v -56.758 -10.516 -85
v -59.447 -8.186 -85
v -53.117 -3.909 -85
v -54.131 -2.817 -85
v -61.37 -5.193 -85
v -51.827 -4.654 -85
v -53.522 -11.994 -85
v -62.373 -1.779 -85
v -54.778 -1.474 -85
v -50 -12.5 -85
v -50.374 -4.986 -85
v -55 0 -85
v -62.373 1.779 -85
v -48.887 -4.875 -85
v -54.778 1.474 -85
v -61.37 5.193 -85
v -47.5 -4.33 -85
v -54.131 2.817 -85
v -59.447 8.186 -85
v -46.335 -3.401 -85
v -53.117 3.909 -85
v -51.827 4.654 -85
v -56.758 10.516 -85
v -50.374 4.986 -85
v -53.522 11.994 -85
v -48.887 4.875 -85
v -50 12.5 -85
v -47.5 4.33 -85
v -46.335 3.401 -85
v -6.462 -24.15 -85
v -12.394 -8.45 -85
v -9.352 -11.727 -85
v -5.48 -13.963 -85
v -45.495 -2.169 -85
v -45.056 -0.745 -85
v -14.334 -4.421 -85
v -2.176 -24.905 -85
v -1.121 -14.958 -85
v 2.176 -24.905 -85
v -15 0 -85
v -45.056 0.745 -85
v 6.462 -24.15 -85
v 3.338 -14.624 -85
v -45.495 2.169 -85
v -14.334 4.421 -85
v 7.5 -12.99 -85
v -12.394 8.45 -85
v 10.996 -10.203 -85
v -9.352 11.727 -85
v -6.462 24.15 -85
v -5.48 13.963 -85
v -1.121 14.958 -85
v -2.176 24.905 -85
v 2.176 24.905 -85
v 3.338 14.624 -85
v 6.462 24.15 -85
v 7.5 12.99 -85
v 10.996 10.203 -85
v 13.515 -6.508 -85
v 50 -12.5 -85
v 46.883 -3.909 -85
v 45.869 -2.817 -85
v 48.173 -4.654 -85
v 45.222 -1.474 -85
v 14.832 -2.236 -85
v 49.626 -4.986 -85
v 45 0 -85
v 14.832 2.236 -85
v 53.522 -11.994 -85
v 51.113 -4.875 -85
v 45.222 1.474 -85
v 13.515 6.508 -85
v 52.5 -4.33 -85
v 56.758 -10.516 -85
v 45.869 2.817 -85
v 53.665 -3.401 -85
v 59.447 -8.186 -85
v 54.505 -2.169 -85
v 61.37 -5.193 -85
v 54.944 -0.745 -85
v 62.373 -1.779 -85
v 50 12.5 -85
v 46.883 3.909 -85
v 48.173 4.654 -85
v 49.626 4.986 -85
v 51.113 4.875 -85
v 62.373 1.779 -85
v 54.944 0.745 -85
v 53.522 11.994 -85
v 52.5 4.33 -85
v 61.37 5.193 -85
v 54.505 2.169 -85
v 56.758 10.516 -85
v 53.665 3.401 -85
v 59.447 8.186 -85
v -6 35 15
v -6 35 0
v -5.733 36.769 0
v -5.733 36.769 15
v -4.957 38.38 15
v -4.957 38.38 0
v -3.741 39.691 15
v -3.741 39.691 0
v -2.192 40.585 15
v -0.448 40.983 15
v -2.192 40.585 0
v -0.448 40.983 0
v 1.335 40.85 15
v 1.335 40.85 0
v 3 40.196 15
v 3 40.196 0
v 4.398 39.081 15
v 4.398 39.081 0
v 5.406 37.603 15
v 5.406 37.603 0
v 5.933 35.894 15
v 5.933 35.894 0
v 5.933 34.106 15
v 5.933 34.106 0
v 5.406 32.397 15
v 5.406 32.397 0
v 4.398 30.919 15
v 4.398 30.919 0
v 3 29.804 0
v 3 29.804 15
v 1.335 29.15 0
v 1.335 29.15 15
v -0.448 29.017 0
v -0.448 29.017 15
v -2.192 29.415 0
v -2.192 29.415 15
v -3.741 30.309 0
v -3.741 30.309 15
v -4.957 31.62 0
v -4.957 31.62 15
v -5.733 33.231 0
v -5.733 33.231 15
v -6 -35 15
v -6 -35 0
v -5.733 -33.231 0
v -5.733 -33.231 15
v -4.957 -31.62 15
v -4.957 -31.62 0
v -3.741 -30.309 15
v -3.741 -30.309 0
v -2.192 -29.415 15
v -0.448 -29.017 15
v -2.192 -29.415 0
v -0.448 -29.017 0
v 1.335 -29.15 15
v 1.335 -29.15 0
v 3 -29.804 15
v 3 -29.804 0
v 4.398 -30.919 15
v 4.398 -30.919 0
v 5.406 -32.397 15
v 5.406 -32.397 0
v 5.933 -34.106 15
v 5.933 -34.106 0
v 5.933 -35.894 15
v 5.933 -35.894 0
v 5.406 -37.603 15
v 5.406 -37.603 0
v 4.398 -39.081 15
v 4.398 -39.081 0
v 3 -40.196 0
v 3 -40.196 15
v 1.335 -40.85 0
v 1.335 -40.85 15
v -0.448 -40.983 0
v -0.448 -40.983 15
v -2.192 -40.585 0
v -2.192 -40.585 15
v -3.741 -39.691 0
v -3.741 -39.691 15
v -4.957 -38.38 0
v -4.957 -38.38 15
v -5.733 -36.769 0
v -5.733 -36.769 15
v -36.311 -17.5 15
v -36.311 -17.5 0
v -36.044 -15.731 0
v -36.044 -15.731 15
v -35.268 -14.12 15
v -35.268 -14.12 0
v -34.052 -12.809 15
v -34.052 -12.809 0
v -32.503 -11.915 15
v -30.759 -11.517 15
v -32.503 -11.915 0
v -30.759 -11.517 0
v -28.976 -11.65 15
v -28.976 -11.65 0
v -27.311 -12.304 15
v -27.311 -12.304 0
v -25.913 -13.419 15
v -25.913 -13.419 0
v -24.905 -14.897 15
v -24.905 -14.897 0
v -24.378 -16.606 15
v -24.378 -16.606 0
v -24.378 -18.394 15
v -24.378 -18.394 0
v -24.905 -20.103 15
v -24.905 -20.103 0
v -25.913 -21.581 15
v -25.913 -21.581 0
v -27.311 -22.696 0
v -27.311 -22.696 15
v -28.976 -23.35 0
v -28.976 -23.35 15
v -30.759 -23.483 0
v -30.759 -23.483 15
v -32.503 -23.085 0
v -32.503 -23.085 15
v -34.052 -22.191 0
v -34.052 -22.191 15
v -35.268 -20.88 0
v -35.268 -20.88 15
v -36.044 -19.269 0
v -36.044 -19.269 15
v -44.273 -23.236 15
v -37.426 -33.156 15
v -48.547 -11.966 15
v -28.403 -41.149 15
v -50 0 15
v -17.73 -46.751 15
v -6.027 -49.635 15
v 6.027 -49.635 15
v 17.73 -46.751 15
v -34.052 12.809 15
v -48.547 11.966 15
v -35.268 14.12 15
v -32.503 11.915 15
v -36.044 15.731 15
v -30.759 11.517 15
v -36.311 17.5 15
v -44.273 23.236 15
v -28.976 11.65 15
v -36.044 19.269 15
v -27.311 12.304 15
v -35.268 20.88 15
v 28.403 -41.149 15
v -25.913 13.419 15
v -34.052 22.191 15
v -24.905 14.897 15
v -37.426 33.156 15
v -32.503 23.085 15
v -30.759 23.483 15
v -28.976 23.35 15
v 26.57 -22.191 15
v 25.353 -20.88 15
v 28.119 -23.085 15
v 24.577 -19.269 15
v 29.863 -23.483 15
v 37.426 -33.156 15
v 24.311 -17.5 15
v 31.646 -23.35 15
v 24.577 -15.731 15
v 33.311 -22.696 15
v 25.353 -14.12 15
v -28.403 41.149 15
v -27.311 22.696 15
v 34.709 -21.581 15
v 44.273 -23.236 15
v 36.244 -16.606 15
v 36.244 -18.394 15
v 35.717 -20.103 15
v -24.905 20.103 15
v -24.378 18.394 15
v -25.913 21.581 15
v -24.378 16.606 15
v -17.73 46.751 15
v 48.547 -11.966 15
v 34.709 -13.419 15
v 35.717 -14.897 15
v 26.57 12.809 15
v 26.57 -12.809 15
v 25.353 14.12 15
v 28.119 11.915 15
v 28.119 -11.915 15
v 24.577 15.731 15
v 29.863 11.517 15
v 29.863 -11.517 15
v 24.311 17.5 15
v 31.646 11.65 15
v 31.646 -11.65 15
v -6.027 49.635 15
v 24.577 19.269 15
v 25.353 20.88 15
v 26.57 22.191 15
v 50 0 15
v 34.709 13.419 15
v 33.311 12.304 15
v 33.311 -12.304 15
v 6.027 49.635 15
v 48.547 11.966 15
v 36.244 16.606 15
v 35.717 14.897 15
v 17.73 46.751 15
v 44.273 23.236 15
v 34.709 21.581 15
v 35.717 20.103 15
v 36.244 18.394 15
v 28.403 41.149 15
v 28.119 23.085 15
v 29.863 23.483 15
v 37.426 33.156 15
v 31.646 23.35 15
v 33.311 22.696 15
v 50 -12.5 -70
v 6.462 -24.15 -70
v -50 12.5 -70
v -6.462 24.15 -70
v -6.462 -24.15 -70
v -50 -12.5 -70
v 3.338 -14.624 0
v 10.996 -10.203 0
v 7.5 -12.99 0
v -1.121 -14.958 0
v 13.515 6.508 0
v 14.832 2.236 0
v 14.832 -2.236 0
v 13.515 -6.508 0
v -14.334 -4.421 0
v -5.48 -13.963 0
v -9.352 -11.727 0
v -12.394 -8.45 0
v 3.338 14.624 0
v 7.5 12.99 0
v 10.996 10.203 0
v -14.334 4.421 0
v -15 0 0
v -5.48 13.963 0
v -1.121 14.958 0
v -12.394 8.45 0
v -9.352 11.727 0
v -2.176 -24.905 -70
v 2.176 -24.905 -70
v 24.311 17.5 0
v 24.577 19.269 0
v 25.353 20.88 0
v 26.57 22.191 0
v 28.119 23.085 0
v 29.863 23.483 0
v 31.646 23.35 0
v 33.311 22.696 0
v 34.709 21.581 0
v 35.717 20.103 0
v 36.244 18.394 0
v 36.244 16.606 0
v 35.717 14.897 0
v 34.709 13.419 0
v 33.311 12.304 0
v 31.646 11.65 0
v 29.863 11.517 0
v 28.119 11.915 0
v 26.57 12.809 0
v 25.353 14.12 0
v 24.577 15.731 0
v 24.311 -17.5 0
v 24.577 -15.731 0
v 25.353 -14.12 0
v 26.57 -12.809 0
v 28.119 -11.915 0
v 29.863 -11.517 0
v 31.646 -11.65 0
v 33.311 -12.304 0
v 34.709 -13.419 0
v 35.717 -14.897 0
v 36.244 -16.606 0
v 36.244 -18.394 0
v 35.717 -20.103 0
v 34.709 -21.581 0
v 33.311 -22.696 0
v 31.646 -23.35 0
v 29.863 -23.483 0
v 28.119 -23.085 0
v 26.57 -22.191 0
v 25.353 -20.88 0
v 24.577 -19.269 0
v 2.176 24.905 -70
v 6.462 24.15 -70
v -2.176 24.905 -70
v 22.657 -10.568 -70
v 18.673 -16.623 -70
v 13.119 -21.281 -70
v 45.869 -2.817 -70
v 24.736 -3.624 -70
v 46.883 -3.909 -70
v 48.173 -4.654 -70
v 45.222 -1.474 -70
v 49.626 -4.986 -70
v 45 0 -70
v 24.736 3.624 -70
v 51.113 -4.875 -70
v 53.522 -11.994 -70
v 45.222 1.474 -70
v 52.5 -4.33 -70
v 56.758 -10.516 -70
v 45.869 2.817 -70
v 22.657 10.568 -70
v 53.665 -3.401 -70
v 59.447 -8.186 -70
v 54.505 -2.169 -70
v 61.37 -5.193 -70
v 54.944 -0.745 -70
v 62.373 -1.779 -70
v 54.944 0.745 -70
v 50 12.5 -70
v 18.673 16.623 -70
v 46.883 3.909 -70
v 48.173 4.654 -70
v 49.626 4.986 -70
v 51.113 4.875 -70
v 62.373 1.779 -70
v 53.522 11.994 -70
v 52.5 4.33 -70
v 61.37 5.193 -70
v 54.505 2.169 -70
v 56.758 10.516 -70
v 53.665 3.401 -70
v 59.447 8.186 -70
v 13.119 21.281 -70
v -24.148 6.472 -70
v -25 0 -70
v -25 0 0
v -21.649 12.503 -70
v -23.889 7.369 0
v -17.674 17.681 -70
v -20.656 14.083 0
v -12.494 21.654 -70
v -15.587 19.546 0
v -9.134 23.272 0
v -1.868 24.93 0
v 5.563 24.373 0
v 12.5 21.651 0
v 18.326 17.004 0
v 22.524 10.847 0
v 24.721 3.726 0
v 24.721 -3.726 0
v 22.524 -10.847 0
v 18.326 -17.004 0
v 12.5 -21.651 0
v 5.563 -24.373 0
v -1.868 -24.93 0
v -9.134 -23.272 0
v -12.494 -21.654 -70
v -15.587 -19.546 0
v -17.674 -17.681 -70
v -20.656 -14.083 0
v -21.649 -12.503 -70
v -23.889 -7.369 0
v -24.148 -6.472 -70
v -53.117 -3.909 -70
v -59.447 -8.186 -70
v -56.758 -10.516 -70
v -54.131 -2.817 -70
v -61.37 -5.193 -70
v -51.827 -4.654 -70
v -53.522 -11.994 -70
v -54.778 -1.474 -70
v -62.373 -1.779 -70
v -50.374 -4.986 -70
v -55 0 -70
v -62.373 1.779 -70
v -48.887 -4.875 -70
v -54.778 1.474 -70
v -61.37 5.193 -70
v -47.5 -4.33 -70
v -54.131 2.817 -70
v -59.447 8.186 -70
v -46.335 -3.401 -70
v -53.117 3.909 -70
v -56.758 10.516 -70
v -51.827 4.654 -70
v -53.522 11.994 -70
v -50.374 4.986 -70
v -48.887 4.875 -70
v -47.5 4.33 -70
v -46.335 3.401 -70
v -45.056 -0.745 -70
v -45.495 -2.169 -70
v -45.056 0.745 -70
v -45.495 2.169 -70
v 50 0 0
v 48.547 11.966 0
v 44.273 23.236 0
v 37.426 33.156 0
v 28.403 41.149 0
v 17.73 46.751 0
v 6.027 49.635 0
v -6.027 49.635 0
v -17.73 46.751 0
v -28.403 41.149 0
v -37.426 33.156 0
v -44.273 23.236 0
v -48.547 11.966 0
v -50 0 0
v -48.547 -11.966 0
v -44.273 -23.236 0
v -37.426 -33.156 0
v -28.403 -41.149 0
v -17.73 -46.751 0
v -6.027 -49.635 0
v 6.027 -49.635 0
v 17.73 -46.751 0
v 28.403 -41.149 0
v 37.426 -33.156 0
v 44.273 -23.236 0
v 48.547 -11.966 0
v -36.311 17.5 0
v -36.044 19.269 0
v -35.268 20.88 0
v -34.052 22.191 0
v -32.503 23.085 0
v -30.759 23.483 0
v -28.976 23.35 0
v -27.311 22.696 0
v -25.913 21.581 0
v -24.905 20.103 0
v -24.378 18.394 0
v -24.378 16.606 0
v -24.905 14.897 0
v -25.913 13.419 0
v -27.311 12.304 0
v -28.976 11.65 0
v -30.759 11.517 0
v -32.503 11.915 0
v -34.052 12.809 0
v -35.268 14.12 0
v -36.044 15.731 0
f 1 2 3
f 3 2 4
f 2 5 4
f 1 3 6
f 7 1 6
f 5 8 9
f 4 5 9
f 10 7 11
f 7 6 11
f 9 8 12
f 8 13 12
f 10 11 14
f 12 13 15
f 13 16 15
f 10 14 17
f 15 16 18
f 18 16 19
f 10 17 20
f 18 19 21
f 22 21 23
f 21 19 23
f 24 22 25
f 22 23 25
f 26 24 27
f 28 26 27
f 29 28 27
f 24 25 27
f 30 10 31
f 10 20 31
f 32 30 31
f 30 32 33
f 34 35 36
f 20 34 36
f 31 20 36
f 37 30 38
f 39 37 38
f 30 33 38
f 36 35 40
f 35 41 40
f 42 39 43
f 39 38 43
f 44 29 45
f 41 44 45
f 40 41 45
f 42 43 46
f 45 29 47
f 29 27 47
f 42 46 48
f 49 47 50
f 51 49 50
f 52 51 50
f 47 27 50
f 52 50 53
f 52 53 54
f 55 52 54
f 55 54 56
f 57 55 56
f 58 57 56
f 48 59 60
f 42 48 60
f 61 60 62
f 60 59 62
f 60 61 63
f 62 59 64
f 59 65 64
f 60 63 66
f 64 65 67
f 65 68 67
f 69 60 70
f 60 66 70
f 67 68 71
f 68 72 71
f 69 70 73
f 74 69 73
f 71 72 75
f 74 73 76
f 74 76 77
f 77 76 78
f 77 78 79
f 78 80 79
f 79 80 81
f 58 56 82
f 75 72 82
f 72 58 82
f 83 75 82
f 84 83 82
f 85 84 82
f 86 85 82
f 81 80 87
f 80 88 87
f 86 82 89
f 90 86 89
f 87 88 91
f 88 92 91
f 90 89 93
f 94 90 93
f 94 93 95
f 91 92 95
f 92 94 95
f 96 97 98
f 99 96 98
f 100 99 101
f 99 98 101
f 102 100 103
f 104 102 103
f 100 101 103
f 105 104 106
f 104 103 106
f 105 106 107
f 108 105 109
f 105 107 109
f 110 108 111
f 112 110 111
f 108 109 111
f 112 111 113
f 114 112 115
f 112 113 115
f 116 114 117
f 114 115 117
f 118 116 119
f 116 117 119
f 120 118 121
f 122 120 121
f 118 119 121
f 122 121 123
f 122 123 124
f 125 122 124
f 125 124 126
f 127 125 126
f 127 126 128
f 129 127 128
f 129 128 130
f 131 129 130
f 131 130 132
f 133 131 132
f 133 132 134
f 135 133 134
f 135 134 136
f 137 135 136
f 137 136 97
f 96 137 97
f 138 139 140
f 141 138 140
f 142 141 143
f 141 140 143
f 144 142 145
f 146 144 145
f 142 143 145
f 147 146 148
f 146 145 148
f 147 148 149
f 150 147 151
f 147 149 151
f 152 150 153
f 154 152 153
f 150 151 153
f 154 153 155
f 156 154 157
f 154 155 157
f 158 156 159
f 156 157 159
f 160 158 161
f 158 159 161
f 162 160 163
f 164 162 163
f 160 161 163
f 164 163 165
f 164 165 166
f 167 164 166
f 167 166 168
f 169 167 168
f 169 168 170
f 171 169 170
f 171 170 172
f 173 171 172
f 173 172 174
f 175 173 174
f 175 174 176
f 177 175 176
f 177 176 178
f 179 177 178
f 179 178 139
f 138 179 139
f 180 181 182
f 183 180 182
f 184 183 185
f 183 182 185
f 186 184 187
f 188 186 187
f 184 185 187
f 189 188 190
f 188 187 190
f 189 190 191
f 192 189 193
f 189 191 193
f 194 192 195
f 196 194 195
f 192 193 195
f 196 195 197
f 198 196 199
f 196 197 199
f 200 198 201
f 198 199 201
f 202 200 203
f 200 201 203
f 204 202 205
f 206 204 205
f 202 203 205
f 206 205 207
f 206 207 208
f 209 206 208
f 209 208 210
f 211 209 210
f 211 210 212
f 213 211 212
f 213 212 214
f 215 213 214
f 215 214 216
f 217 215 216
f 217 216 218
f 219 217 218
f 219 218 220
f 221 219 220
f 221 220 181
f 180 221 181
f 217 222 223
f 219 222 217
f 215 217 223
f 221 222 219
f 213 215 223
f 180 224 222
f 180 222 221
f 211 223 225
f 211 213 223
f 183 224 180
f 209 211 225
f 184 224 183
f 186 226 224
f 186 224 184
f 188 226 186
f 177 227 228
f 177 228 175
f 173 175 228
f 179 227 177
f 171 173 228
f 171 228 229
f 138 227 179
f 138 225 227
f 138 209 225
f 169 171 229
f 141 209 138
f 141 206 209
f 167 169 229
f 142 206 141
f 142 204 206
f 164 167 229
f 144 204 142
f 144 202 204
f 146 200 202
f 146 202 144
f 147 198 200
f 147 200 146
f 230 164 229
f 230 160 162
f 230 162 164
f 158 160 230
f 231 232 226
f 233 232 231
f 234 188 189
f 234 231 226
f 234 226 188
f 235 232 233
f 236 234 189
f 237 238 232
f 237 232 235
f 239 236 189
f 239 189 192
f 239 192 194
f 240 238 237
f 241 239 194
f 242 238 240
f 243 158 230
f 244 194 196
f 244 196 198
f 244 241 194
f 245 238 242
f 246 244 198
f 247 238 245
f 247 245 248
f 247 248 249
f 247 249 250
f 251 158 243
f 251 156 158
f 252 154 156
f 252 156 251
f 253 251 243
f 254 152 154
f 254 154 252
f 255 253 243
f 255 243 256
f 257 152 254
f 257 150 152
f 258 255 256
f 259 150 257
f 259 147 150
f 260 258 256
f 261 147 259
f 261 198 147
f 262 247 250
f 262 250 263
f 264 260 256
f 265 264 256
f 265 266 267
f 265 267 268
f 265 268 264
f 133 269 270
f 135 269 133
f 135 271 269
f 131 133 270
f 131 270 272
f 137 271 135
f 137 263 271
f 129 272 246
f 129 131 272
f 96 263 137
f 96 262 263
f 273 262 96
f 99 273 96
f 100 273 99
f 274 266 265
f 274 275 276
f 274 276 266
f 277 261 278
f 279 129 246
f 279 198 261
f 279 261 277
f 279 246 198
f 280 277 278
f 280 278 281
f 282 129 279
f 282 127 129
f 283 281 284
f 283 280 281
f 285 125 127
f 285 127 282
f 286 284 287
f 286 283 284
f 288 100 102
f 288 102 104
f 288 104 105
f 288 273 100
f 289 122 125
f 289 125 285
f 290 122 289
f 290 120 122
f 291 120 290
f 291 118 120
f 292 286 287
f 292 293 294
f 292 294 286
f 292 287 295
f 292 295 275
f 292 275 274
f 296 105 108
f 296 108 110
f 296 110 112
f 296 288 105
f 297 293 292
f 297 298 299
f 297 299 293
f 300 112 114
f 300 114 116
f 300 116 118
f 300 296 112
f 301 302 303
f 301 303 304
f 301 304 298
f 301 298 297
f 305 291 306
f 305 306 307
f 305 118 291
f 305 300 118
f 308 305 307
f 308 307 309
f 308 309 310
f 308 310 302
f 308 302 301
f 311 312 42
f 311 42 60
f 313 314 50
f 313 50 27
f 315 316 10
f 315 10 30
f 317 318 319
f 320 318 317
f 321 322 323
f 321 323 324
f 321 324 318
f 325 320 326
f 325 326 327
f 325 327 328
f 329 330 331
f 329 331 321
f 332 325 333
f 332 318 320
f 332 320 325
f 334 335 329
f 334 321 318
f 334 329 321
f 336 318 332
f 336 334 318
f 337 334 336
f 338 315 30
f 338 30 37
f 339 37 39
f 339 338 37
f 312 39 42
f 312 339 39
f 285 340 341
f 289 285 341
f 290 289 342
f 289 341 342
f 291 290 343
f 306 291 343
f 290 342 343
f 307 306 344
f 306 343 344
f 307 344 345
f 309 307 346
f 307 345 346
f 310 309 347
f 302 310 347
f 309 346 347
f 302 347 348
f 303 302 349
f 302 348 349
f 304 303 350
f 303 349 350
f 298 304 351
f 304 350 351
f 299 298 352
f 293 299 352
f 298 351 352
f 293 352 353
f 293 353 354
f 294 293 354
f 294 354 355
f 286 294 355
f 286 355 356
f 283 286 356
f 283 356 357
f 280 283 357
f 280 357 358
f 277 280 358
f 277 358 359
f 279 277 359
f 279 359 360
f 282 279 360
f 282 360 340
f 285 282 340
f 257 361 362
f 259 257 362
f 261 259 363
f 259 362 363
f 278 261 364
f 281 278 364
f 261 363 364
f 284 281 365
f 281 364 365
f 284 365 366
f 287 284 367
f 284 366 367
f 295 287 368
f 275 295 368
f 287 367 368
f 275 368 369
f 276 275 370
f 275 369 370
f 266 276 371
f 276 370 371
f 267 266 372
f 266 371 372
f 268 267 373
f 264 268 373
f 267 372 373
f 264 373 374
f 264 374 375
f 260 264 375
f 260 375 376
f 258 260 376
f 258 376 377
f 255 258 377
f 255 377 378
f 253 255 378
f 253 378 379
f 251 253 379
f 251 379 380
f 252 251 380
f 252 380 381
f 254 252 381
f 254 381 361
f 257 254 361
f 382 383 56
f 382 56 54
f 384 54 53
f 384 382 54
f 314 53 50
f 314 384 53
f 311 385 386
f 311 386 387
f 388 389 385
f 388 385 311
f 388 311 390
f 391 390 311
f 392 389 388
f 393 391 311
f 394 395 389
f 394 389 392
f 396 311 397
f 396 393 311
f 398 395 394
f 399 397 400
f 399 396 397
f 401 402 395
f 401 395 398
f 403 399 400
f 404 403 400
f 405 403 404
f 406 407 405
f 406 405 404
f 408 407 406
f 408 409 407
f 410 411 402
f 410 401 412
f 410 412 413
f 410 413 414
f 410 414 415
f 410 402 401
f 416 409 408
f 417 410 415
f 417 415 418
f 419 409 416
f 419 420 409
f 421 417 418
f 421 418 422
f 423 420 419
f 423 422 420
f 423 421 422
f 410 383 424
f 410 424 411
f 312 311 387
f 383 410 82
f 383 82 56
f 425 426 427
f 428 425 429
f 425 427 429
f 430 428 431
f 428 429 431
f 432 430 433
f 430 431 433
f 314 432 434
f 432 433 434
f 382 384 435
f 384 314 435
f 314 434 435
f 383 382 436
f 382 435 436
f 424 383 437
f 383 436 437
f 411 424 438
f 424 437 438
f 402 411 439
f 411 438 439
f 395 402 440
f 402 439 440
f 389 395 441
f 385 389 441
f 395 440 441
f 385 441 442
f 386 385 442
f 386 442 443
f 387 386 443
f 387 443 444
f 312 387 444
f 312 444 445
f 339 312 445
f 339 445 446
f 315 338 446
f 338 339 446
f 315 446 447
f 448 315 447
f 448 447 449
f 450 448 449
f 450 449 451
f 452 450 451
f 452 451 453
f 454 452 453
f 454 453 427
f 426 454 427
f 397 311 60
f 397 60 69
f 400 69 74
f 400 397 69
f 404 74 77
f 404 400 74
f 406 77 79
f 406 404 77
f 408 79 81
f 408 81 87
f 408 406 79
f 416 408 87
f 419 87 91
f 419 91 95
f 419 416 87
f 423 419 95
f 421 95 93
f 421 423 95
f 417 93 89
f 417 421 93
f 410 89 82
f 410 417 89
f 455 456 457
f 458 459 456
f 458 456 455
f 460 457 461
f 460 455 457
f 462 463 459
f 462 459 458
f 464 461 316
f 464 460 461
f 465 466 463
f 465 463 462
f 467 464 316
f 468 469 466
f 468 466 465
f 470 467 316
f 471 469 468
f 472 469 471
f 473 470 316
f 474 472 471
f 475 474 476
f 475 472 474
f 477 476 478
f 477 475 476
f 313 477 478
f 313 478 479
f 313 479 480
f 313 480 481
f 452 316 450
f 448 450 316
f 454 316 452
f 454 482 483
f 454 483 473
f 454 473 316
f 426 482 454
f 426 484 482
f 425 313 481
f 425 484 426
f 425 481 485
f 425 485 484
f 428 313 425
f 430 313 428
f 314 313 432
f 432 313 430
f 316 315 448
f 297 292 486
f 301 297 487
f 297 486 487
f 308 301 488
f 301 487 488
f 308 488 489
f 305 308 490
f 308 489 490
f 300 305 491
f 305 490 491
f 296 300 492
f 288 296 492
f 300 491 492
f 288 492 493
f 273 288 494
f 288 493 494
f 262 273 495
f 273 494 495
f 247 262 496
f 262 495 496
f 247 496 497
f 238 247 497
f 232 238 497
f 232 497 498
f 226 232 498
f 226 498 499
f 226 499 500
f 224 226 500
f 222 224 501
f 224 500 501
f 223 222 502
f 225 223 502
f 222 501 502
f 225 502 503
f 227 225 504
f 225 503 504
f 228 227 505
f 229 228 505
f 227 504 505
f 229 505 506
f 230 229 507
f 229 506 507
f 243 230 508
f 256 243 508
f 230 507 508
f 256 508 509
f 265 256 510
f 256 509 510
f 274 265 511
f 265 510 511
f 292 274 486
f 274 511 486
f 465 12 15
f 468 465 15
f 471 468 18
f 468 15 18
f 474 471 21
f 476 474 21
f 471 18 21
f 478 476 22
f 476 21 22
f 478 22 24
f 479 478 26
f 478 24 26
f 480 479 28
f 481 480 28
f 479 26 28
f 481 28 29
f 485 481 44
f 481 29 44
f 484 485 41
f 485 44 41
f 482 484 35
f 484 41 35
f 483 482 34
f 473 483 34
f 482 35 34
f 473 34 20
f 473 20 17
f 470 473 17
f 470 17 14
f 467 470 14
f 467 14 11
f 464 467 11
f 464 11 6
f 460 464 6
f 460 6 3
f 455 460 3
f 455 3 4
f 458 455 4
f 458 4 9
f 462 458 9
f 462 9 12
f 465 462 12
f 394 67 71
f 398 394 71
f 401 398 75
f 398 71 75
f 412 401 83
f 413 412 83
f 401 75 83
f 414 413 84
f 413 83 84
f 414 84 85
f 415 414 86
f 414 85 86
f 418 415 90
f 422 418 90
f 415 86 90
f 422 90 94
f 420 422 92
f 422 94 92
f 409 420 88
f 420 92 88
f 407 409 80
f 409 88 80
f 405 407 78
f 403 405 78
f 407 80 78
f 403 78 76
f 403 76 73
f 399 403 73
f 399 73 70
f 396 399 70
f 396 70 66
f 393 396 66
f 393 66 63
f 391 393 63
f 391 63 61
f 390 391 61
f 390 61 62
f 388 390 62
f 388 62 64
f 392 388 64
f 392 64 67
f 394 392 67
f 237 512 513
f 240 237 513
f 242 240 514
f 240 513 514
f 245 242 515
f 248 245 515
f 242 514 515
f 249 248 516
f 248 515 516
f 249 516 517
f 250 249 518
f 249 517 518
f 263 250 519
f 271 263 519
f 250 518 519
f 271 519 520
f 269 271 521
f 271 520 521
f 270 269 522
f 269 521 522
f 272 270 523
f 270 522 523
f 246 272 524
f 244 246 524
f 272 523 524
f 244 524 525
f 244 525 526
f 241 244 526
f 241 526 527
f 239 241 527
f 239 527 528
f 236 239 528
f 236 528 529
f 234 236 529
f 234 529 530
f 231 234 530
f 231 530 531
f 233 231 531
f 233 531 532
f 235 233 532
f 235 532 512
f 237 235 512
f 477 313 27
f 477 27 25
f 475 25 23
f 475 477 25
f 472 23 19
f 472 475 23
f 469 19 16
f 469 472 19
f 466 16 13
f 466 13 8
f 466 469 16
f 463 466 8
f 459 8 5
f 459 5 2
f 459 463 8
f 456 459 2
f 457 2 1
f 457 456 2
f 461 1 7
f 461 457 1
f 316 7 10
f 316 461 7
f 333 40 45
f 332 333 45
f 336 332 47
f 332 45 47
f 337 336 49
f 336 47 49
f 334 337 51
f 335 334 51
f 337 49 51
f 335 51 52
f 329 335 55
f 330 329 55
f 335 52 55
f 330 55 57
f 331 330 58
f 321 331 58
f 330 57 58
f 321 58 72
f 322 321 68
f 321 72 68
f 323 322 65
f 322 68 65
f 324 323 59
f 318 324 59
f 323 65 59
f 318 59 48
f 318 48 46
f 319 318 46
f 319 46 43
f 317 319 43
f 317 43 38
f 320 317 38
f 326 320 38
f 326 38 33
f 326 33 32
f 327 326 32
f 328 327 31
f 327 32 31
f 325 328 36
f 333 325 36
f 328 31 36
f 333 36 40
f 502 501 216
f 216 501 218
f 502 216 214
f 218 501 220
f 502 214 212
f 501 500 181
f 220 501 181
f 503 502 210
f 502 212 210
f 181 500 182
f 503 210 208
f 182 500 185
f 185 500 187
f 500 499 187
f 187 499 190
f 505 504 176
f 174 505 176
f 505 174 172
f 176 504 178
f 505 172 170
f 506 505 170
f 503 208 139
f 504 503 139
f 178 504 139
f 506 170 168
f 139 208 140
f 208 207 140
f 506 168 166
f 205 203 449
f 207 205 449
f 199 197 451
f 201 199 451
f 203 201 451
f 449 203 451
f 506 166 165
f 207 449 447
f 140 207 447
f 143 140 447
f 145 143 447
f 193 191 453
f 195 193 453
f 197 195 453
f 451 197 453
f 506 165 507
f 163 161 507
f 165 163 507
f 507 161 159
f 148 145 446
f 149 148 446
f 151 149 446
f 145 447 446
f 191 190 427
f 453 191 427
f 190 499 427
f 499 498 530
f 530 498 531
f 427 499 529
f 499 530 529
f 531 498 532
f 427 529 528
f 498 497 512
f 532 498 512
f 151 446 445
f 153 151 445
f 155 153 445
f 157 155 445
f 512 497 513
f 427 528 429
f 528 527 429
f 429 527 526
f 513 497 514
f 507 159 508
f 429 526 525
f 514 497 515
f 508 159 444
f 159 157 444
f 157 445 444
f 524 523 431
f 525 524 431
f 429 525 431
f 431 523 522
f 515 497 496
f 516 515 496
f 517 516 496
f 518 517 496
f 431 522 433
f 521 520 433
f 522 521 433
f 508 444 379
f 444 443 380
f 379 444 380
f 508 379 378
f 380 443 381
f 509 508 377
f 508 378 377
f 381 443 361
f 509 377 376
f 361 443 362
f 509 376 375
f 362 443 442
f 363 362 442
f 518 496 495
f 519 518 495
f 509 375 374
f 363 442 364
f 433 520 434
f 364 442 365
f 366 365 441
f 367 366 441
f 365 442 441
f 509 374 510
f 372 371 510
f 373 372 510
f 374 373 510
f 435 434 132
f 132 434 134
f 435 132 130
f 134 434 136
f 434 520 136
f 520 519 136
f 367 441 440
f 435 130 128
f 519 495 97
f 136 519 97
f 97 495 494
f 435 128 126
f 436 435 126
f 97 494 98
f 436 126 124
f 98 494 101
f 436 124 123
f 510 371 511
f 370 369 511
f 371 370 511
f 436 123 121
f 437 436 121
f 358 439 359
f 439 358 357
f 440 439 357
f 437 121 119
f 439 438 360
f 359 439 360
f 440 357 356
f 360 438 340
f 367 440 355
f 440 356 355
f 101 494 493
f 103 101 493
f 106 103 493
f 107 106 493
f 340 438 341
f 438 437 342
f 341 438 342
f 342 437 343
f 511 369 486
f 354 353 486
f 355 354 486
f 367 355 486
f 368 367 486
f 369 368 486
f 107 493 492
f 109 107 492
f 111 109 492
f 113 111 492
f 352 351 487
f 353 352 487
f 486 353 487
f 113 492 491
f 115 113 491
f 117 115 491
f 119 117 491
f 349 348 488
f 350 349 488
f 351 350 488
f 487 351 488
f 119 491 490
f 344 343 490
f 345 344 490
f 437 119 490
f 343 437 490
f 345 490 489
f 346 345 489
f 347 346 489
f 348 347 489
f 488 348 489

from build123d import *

# Parameters (mm, degrees)
SKETCH1_R           = 50
BOSS_EXTRUDE1_DEPTH = 15
SKETCH2_R           = 25
BOSS_EXTRUDE2_DEPTH = 70
BOSS_EXTRUDE3_DEPTH = 15
SKETCH5_R           = 15
CUT_EXTRUDE1_DEPTH  = 85
SKETCH6_R           = 5
CUT_EXTRUDE2_DEPTH  = 30
SKETCH7_R           = 6
CUT_EXTRUDE3_DEPTH  = 30


with BuildPart() as part:
    # Sketch1 → Boss-Extrude1 (new body)
    with BuildSketch(Plane.XY):
        Circle(SKETCH1_R)
    extrude(amount=BOSS_EXTRUDE1_DEPTH)

    # Sketch2 → Boss-Extrude2 (add)
    with BuildSketch(Plane(origin=(0, 0, 0), x_dir=(-1, 0, 0), z_dir=(0, 0, -1))):
        Circle(SKETCH2_R)
    extrude(amount=BOSS_EXTRUDE2_DEPTH)

    # Sketch4 → Boss-Extrude3 (add)
    with BuildSketch(Plane(origin=(0, 0, -70), x_dir=(-1, 0, 0), z_dir=(0, 0, -1))):
        with BuildLine():
            Line((-50, 12.5), (-6.462424595, 24.15030162))
            ThreePointArc((-6.462424595, 24.15030162), (0, 25), (6.462424595, 24.15030162))
            Line((6.462424595, 24.15030162), (50, 12.5))
            ThreePointArc((50, 12.5), (62.5, 0), (50, -12.5))
            Line((50, -12.5), (6.462424595, -24.15030162))
            ThreePointArc((6.462424595, -24.15030162), (0, -25), (-6.462424595, -24.15030162))
            Line((-6.462424595, -24.15030162), (-50, -12.5))
            ThreePointArc((-50, -12.5), (-62.5, 0), (-50, 12.5))
        make_face()
    extrude(amount=BOSS_EXTRUDE3_DEPTH)

    # Sketch5 → Cut-Extrude1 (cut)
    with BuildSketch(Plane(origin=(0, 0, -85), x_dir=(-1, 0, 0), z_dir=(0, 0, -1))):
        Circle(SKETCH5_R)
    extrude(amount=-CUT_EXTRUDE1_DEPTH, mode=Mode.SUBTRACT)

    # Sketch6 → Cut-Extrude2 (cut)
    with BuildSketch(Plane(origin=(0, 0, -85), x_dir=(-1, 0, 0), z_dir=(0, 0, -1))):
        with Locations((50, 0)):
            Circle(SKETCH6_R)
        with Locations((-50, 0)):
            Circle(SKETCH6_R)
    extrude(amount=-CUT_EXTRUDE2_DEPTH, mode=Mode.SUBTRACT)

    # Sketch7 → Cut-Extrude3 (cut)
    with BuildSketch(Plane(origin=(0, 0, 0), x_dir=(-1, 0, 0), z_dir=(0, 0, -1))):
        with Locations((0, 35)):
            Circle(SKETCH7_R)
        with Locations((30.310889132, 17.5)):
            Circle(SKETCH7_R)
        with Locations((30.310889132, -17.5)):
            Circle(SKETCH7_R)
        with Locations((0, -35)):
            Circle(SKETCH7_R)
        with Locations((-30.310889132, -17.5)):
            Circle(SKETCH7_R)
        with Locations((-30.310889132, 17.5)):
            Circle(SKETCH7_R)
    extrude(amount=-CUT_EXTRUDE3_DEPTH, mode=Mode.SUBTRACT)


solid = part.part
